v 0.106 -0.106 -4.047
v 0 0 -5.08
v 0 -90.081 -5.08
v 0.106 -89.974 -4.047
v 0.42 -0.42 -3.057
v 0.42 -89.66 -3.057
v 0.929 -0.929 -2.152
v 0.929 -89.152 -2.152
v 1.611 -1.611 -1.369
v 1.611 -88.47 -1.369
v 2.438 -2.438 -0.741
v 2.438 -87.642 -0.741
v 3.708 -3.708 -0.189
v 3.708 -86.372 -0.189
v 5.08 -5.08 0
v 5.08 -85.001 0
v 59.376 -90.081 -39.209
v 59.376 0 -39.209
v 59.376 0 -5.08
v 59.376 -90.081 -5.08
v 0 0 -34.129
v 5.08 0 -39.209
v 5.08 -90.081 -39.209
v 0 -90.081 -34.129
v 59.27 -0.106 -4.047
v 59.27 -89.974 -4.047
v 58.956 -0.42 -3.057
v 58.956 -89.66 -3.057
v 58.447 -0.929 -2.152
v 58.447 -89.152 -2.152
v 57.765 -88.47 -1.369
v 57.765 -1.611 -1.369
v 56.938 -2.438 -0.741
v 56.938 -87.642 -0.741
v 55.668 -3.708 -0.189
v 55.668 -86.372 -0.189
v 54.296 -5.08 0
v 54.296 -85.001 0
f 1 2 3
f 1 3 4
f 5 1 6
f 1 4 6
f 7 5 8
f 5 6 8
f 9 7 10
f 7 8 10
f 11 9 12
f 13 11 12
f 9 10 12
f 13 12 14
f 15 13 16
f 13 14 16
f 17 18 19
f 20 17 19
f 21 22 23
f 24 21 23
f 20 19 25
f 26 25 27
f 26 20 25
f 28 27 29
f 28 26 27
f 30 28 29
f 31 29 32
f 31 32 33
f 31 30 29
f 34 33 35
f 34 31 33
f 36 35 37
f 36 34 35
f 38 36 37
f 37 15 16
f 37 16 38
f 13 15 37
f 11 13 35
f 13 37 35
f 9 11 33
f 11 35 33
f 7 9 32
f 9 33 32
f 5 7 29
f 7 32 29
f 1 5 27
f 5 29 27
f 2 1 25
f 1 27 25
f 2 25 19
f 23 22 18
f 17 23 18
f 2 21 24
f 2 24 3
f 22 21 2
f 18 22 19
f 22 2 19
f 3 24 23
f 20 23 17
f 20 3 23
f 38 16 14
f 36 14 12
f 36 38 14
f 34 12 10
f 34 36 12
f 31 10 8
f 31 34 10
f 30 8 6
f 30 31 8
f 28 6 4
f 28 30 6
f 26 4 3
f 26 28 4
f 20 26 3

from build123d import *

# Parameters (mm, degrees)
F0_W     = 59.375703
F0_H     = 39.209425
F1_DEPTH = 90.080572
F3_R     = 5.08
F2_SIZE  = 5.08


with BuildPart() as f1:
    # F0 (on Front) → F1 (new body)
    with BuildSketch(Plane.XZ):
        with Locations((29.687851, -19.604712)):
            Rectangle(F0_W, F0_H)
    extrude(amount=F1_DEPTH)

    # F3
    f3_edges = [f1.edges().sort_by_distance(p)[0] for p in [
        (59.375703, -45.040286, 0),
        (0, -45.040286, 0),
        (29.687852, 0, 0),
        (29.687852, -90.080572, 0),
    ]]
    fillet(f3_edges, radius=F3_R)

    # F2
    f2_edges = [f1.edges().sort_by_distance(p)[0] for p in [
        (0, -45.040286, -39.209425),
    ]]
    chamfer(f2_edges, length=F2_SIZE)


solid = f1.part
